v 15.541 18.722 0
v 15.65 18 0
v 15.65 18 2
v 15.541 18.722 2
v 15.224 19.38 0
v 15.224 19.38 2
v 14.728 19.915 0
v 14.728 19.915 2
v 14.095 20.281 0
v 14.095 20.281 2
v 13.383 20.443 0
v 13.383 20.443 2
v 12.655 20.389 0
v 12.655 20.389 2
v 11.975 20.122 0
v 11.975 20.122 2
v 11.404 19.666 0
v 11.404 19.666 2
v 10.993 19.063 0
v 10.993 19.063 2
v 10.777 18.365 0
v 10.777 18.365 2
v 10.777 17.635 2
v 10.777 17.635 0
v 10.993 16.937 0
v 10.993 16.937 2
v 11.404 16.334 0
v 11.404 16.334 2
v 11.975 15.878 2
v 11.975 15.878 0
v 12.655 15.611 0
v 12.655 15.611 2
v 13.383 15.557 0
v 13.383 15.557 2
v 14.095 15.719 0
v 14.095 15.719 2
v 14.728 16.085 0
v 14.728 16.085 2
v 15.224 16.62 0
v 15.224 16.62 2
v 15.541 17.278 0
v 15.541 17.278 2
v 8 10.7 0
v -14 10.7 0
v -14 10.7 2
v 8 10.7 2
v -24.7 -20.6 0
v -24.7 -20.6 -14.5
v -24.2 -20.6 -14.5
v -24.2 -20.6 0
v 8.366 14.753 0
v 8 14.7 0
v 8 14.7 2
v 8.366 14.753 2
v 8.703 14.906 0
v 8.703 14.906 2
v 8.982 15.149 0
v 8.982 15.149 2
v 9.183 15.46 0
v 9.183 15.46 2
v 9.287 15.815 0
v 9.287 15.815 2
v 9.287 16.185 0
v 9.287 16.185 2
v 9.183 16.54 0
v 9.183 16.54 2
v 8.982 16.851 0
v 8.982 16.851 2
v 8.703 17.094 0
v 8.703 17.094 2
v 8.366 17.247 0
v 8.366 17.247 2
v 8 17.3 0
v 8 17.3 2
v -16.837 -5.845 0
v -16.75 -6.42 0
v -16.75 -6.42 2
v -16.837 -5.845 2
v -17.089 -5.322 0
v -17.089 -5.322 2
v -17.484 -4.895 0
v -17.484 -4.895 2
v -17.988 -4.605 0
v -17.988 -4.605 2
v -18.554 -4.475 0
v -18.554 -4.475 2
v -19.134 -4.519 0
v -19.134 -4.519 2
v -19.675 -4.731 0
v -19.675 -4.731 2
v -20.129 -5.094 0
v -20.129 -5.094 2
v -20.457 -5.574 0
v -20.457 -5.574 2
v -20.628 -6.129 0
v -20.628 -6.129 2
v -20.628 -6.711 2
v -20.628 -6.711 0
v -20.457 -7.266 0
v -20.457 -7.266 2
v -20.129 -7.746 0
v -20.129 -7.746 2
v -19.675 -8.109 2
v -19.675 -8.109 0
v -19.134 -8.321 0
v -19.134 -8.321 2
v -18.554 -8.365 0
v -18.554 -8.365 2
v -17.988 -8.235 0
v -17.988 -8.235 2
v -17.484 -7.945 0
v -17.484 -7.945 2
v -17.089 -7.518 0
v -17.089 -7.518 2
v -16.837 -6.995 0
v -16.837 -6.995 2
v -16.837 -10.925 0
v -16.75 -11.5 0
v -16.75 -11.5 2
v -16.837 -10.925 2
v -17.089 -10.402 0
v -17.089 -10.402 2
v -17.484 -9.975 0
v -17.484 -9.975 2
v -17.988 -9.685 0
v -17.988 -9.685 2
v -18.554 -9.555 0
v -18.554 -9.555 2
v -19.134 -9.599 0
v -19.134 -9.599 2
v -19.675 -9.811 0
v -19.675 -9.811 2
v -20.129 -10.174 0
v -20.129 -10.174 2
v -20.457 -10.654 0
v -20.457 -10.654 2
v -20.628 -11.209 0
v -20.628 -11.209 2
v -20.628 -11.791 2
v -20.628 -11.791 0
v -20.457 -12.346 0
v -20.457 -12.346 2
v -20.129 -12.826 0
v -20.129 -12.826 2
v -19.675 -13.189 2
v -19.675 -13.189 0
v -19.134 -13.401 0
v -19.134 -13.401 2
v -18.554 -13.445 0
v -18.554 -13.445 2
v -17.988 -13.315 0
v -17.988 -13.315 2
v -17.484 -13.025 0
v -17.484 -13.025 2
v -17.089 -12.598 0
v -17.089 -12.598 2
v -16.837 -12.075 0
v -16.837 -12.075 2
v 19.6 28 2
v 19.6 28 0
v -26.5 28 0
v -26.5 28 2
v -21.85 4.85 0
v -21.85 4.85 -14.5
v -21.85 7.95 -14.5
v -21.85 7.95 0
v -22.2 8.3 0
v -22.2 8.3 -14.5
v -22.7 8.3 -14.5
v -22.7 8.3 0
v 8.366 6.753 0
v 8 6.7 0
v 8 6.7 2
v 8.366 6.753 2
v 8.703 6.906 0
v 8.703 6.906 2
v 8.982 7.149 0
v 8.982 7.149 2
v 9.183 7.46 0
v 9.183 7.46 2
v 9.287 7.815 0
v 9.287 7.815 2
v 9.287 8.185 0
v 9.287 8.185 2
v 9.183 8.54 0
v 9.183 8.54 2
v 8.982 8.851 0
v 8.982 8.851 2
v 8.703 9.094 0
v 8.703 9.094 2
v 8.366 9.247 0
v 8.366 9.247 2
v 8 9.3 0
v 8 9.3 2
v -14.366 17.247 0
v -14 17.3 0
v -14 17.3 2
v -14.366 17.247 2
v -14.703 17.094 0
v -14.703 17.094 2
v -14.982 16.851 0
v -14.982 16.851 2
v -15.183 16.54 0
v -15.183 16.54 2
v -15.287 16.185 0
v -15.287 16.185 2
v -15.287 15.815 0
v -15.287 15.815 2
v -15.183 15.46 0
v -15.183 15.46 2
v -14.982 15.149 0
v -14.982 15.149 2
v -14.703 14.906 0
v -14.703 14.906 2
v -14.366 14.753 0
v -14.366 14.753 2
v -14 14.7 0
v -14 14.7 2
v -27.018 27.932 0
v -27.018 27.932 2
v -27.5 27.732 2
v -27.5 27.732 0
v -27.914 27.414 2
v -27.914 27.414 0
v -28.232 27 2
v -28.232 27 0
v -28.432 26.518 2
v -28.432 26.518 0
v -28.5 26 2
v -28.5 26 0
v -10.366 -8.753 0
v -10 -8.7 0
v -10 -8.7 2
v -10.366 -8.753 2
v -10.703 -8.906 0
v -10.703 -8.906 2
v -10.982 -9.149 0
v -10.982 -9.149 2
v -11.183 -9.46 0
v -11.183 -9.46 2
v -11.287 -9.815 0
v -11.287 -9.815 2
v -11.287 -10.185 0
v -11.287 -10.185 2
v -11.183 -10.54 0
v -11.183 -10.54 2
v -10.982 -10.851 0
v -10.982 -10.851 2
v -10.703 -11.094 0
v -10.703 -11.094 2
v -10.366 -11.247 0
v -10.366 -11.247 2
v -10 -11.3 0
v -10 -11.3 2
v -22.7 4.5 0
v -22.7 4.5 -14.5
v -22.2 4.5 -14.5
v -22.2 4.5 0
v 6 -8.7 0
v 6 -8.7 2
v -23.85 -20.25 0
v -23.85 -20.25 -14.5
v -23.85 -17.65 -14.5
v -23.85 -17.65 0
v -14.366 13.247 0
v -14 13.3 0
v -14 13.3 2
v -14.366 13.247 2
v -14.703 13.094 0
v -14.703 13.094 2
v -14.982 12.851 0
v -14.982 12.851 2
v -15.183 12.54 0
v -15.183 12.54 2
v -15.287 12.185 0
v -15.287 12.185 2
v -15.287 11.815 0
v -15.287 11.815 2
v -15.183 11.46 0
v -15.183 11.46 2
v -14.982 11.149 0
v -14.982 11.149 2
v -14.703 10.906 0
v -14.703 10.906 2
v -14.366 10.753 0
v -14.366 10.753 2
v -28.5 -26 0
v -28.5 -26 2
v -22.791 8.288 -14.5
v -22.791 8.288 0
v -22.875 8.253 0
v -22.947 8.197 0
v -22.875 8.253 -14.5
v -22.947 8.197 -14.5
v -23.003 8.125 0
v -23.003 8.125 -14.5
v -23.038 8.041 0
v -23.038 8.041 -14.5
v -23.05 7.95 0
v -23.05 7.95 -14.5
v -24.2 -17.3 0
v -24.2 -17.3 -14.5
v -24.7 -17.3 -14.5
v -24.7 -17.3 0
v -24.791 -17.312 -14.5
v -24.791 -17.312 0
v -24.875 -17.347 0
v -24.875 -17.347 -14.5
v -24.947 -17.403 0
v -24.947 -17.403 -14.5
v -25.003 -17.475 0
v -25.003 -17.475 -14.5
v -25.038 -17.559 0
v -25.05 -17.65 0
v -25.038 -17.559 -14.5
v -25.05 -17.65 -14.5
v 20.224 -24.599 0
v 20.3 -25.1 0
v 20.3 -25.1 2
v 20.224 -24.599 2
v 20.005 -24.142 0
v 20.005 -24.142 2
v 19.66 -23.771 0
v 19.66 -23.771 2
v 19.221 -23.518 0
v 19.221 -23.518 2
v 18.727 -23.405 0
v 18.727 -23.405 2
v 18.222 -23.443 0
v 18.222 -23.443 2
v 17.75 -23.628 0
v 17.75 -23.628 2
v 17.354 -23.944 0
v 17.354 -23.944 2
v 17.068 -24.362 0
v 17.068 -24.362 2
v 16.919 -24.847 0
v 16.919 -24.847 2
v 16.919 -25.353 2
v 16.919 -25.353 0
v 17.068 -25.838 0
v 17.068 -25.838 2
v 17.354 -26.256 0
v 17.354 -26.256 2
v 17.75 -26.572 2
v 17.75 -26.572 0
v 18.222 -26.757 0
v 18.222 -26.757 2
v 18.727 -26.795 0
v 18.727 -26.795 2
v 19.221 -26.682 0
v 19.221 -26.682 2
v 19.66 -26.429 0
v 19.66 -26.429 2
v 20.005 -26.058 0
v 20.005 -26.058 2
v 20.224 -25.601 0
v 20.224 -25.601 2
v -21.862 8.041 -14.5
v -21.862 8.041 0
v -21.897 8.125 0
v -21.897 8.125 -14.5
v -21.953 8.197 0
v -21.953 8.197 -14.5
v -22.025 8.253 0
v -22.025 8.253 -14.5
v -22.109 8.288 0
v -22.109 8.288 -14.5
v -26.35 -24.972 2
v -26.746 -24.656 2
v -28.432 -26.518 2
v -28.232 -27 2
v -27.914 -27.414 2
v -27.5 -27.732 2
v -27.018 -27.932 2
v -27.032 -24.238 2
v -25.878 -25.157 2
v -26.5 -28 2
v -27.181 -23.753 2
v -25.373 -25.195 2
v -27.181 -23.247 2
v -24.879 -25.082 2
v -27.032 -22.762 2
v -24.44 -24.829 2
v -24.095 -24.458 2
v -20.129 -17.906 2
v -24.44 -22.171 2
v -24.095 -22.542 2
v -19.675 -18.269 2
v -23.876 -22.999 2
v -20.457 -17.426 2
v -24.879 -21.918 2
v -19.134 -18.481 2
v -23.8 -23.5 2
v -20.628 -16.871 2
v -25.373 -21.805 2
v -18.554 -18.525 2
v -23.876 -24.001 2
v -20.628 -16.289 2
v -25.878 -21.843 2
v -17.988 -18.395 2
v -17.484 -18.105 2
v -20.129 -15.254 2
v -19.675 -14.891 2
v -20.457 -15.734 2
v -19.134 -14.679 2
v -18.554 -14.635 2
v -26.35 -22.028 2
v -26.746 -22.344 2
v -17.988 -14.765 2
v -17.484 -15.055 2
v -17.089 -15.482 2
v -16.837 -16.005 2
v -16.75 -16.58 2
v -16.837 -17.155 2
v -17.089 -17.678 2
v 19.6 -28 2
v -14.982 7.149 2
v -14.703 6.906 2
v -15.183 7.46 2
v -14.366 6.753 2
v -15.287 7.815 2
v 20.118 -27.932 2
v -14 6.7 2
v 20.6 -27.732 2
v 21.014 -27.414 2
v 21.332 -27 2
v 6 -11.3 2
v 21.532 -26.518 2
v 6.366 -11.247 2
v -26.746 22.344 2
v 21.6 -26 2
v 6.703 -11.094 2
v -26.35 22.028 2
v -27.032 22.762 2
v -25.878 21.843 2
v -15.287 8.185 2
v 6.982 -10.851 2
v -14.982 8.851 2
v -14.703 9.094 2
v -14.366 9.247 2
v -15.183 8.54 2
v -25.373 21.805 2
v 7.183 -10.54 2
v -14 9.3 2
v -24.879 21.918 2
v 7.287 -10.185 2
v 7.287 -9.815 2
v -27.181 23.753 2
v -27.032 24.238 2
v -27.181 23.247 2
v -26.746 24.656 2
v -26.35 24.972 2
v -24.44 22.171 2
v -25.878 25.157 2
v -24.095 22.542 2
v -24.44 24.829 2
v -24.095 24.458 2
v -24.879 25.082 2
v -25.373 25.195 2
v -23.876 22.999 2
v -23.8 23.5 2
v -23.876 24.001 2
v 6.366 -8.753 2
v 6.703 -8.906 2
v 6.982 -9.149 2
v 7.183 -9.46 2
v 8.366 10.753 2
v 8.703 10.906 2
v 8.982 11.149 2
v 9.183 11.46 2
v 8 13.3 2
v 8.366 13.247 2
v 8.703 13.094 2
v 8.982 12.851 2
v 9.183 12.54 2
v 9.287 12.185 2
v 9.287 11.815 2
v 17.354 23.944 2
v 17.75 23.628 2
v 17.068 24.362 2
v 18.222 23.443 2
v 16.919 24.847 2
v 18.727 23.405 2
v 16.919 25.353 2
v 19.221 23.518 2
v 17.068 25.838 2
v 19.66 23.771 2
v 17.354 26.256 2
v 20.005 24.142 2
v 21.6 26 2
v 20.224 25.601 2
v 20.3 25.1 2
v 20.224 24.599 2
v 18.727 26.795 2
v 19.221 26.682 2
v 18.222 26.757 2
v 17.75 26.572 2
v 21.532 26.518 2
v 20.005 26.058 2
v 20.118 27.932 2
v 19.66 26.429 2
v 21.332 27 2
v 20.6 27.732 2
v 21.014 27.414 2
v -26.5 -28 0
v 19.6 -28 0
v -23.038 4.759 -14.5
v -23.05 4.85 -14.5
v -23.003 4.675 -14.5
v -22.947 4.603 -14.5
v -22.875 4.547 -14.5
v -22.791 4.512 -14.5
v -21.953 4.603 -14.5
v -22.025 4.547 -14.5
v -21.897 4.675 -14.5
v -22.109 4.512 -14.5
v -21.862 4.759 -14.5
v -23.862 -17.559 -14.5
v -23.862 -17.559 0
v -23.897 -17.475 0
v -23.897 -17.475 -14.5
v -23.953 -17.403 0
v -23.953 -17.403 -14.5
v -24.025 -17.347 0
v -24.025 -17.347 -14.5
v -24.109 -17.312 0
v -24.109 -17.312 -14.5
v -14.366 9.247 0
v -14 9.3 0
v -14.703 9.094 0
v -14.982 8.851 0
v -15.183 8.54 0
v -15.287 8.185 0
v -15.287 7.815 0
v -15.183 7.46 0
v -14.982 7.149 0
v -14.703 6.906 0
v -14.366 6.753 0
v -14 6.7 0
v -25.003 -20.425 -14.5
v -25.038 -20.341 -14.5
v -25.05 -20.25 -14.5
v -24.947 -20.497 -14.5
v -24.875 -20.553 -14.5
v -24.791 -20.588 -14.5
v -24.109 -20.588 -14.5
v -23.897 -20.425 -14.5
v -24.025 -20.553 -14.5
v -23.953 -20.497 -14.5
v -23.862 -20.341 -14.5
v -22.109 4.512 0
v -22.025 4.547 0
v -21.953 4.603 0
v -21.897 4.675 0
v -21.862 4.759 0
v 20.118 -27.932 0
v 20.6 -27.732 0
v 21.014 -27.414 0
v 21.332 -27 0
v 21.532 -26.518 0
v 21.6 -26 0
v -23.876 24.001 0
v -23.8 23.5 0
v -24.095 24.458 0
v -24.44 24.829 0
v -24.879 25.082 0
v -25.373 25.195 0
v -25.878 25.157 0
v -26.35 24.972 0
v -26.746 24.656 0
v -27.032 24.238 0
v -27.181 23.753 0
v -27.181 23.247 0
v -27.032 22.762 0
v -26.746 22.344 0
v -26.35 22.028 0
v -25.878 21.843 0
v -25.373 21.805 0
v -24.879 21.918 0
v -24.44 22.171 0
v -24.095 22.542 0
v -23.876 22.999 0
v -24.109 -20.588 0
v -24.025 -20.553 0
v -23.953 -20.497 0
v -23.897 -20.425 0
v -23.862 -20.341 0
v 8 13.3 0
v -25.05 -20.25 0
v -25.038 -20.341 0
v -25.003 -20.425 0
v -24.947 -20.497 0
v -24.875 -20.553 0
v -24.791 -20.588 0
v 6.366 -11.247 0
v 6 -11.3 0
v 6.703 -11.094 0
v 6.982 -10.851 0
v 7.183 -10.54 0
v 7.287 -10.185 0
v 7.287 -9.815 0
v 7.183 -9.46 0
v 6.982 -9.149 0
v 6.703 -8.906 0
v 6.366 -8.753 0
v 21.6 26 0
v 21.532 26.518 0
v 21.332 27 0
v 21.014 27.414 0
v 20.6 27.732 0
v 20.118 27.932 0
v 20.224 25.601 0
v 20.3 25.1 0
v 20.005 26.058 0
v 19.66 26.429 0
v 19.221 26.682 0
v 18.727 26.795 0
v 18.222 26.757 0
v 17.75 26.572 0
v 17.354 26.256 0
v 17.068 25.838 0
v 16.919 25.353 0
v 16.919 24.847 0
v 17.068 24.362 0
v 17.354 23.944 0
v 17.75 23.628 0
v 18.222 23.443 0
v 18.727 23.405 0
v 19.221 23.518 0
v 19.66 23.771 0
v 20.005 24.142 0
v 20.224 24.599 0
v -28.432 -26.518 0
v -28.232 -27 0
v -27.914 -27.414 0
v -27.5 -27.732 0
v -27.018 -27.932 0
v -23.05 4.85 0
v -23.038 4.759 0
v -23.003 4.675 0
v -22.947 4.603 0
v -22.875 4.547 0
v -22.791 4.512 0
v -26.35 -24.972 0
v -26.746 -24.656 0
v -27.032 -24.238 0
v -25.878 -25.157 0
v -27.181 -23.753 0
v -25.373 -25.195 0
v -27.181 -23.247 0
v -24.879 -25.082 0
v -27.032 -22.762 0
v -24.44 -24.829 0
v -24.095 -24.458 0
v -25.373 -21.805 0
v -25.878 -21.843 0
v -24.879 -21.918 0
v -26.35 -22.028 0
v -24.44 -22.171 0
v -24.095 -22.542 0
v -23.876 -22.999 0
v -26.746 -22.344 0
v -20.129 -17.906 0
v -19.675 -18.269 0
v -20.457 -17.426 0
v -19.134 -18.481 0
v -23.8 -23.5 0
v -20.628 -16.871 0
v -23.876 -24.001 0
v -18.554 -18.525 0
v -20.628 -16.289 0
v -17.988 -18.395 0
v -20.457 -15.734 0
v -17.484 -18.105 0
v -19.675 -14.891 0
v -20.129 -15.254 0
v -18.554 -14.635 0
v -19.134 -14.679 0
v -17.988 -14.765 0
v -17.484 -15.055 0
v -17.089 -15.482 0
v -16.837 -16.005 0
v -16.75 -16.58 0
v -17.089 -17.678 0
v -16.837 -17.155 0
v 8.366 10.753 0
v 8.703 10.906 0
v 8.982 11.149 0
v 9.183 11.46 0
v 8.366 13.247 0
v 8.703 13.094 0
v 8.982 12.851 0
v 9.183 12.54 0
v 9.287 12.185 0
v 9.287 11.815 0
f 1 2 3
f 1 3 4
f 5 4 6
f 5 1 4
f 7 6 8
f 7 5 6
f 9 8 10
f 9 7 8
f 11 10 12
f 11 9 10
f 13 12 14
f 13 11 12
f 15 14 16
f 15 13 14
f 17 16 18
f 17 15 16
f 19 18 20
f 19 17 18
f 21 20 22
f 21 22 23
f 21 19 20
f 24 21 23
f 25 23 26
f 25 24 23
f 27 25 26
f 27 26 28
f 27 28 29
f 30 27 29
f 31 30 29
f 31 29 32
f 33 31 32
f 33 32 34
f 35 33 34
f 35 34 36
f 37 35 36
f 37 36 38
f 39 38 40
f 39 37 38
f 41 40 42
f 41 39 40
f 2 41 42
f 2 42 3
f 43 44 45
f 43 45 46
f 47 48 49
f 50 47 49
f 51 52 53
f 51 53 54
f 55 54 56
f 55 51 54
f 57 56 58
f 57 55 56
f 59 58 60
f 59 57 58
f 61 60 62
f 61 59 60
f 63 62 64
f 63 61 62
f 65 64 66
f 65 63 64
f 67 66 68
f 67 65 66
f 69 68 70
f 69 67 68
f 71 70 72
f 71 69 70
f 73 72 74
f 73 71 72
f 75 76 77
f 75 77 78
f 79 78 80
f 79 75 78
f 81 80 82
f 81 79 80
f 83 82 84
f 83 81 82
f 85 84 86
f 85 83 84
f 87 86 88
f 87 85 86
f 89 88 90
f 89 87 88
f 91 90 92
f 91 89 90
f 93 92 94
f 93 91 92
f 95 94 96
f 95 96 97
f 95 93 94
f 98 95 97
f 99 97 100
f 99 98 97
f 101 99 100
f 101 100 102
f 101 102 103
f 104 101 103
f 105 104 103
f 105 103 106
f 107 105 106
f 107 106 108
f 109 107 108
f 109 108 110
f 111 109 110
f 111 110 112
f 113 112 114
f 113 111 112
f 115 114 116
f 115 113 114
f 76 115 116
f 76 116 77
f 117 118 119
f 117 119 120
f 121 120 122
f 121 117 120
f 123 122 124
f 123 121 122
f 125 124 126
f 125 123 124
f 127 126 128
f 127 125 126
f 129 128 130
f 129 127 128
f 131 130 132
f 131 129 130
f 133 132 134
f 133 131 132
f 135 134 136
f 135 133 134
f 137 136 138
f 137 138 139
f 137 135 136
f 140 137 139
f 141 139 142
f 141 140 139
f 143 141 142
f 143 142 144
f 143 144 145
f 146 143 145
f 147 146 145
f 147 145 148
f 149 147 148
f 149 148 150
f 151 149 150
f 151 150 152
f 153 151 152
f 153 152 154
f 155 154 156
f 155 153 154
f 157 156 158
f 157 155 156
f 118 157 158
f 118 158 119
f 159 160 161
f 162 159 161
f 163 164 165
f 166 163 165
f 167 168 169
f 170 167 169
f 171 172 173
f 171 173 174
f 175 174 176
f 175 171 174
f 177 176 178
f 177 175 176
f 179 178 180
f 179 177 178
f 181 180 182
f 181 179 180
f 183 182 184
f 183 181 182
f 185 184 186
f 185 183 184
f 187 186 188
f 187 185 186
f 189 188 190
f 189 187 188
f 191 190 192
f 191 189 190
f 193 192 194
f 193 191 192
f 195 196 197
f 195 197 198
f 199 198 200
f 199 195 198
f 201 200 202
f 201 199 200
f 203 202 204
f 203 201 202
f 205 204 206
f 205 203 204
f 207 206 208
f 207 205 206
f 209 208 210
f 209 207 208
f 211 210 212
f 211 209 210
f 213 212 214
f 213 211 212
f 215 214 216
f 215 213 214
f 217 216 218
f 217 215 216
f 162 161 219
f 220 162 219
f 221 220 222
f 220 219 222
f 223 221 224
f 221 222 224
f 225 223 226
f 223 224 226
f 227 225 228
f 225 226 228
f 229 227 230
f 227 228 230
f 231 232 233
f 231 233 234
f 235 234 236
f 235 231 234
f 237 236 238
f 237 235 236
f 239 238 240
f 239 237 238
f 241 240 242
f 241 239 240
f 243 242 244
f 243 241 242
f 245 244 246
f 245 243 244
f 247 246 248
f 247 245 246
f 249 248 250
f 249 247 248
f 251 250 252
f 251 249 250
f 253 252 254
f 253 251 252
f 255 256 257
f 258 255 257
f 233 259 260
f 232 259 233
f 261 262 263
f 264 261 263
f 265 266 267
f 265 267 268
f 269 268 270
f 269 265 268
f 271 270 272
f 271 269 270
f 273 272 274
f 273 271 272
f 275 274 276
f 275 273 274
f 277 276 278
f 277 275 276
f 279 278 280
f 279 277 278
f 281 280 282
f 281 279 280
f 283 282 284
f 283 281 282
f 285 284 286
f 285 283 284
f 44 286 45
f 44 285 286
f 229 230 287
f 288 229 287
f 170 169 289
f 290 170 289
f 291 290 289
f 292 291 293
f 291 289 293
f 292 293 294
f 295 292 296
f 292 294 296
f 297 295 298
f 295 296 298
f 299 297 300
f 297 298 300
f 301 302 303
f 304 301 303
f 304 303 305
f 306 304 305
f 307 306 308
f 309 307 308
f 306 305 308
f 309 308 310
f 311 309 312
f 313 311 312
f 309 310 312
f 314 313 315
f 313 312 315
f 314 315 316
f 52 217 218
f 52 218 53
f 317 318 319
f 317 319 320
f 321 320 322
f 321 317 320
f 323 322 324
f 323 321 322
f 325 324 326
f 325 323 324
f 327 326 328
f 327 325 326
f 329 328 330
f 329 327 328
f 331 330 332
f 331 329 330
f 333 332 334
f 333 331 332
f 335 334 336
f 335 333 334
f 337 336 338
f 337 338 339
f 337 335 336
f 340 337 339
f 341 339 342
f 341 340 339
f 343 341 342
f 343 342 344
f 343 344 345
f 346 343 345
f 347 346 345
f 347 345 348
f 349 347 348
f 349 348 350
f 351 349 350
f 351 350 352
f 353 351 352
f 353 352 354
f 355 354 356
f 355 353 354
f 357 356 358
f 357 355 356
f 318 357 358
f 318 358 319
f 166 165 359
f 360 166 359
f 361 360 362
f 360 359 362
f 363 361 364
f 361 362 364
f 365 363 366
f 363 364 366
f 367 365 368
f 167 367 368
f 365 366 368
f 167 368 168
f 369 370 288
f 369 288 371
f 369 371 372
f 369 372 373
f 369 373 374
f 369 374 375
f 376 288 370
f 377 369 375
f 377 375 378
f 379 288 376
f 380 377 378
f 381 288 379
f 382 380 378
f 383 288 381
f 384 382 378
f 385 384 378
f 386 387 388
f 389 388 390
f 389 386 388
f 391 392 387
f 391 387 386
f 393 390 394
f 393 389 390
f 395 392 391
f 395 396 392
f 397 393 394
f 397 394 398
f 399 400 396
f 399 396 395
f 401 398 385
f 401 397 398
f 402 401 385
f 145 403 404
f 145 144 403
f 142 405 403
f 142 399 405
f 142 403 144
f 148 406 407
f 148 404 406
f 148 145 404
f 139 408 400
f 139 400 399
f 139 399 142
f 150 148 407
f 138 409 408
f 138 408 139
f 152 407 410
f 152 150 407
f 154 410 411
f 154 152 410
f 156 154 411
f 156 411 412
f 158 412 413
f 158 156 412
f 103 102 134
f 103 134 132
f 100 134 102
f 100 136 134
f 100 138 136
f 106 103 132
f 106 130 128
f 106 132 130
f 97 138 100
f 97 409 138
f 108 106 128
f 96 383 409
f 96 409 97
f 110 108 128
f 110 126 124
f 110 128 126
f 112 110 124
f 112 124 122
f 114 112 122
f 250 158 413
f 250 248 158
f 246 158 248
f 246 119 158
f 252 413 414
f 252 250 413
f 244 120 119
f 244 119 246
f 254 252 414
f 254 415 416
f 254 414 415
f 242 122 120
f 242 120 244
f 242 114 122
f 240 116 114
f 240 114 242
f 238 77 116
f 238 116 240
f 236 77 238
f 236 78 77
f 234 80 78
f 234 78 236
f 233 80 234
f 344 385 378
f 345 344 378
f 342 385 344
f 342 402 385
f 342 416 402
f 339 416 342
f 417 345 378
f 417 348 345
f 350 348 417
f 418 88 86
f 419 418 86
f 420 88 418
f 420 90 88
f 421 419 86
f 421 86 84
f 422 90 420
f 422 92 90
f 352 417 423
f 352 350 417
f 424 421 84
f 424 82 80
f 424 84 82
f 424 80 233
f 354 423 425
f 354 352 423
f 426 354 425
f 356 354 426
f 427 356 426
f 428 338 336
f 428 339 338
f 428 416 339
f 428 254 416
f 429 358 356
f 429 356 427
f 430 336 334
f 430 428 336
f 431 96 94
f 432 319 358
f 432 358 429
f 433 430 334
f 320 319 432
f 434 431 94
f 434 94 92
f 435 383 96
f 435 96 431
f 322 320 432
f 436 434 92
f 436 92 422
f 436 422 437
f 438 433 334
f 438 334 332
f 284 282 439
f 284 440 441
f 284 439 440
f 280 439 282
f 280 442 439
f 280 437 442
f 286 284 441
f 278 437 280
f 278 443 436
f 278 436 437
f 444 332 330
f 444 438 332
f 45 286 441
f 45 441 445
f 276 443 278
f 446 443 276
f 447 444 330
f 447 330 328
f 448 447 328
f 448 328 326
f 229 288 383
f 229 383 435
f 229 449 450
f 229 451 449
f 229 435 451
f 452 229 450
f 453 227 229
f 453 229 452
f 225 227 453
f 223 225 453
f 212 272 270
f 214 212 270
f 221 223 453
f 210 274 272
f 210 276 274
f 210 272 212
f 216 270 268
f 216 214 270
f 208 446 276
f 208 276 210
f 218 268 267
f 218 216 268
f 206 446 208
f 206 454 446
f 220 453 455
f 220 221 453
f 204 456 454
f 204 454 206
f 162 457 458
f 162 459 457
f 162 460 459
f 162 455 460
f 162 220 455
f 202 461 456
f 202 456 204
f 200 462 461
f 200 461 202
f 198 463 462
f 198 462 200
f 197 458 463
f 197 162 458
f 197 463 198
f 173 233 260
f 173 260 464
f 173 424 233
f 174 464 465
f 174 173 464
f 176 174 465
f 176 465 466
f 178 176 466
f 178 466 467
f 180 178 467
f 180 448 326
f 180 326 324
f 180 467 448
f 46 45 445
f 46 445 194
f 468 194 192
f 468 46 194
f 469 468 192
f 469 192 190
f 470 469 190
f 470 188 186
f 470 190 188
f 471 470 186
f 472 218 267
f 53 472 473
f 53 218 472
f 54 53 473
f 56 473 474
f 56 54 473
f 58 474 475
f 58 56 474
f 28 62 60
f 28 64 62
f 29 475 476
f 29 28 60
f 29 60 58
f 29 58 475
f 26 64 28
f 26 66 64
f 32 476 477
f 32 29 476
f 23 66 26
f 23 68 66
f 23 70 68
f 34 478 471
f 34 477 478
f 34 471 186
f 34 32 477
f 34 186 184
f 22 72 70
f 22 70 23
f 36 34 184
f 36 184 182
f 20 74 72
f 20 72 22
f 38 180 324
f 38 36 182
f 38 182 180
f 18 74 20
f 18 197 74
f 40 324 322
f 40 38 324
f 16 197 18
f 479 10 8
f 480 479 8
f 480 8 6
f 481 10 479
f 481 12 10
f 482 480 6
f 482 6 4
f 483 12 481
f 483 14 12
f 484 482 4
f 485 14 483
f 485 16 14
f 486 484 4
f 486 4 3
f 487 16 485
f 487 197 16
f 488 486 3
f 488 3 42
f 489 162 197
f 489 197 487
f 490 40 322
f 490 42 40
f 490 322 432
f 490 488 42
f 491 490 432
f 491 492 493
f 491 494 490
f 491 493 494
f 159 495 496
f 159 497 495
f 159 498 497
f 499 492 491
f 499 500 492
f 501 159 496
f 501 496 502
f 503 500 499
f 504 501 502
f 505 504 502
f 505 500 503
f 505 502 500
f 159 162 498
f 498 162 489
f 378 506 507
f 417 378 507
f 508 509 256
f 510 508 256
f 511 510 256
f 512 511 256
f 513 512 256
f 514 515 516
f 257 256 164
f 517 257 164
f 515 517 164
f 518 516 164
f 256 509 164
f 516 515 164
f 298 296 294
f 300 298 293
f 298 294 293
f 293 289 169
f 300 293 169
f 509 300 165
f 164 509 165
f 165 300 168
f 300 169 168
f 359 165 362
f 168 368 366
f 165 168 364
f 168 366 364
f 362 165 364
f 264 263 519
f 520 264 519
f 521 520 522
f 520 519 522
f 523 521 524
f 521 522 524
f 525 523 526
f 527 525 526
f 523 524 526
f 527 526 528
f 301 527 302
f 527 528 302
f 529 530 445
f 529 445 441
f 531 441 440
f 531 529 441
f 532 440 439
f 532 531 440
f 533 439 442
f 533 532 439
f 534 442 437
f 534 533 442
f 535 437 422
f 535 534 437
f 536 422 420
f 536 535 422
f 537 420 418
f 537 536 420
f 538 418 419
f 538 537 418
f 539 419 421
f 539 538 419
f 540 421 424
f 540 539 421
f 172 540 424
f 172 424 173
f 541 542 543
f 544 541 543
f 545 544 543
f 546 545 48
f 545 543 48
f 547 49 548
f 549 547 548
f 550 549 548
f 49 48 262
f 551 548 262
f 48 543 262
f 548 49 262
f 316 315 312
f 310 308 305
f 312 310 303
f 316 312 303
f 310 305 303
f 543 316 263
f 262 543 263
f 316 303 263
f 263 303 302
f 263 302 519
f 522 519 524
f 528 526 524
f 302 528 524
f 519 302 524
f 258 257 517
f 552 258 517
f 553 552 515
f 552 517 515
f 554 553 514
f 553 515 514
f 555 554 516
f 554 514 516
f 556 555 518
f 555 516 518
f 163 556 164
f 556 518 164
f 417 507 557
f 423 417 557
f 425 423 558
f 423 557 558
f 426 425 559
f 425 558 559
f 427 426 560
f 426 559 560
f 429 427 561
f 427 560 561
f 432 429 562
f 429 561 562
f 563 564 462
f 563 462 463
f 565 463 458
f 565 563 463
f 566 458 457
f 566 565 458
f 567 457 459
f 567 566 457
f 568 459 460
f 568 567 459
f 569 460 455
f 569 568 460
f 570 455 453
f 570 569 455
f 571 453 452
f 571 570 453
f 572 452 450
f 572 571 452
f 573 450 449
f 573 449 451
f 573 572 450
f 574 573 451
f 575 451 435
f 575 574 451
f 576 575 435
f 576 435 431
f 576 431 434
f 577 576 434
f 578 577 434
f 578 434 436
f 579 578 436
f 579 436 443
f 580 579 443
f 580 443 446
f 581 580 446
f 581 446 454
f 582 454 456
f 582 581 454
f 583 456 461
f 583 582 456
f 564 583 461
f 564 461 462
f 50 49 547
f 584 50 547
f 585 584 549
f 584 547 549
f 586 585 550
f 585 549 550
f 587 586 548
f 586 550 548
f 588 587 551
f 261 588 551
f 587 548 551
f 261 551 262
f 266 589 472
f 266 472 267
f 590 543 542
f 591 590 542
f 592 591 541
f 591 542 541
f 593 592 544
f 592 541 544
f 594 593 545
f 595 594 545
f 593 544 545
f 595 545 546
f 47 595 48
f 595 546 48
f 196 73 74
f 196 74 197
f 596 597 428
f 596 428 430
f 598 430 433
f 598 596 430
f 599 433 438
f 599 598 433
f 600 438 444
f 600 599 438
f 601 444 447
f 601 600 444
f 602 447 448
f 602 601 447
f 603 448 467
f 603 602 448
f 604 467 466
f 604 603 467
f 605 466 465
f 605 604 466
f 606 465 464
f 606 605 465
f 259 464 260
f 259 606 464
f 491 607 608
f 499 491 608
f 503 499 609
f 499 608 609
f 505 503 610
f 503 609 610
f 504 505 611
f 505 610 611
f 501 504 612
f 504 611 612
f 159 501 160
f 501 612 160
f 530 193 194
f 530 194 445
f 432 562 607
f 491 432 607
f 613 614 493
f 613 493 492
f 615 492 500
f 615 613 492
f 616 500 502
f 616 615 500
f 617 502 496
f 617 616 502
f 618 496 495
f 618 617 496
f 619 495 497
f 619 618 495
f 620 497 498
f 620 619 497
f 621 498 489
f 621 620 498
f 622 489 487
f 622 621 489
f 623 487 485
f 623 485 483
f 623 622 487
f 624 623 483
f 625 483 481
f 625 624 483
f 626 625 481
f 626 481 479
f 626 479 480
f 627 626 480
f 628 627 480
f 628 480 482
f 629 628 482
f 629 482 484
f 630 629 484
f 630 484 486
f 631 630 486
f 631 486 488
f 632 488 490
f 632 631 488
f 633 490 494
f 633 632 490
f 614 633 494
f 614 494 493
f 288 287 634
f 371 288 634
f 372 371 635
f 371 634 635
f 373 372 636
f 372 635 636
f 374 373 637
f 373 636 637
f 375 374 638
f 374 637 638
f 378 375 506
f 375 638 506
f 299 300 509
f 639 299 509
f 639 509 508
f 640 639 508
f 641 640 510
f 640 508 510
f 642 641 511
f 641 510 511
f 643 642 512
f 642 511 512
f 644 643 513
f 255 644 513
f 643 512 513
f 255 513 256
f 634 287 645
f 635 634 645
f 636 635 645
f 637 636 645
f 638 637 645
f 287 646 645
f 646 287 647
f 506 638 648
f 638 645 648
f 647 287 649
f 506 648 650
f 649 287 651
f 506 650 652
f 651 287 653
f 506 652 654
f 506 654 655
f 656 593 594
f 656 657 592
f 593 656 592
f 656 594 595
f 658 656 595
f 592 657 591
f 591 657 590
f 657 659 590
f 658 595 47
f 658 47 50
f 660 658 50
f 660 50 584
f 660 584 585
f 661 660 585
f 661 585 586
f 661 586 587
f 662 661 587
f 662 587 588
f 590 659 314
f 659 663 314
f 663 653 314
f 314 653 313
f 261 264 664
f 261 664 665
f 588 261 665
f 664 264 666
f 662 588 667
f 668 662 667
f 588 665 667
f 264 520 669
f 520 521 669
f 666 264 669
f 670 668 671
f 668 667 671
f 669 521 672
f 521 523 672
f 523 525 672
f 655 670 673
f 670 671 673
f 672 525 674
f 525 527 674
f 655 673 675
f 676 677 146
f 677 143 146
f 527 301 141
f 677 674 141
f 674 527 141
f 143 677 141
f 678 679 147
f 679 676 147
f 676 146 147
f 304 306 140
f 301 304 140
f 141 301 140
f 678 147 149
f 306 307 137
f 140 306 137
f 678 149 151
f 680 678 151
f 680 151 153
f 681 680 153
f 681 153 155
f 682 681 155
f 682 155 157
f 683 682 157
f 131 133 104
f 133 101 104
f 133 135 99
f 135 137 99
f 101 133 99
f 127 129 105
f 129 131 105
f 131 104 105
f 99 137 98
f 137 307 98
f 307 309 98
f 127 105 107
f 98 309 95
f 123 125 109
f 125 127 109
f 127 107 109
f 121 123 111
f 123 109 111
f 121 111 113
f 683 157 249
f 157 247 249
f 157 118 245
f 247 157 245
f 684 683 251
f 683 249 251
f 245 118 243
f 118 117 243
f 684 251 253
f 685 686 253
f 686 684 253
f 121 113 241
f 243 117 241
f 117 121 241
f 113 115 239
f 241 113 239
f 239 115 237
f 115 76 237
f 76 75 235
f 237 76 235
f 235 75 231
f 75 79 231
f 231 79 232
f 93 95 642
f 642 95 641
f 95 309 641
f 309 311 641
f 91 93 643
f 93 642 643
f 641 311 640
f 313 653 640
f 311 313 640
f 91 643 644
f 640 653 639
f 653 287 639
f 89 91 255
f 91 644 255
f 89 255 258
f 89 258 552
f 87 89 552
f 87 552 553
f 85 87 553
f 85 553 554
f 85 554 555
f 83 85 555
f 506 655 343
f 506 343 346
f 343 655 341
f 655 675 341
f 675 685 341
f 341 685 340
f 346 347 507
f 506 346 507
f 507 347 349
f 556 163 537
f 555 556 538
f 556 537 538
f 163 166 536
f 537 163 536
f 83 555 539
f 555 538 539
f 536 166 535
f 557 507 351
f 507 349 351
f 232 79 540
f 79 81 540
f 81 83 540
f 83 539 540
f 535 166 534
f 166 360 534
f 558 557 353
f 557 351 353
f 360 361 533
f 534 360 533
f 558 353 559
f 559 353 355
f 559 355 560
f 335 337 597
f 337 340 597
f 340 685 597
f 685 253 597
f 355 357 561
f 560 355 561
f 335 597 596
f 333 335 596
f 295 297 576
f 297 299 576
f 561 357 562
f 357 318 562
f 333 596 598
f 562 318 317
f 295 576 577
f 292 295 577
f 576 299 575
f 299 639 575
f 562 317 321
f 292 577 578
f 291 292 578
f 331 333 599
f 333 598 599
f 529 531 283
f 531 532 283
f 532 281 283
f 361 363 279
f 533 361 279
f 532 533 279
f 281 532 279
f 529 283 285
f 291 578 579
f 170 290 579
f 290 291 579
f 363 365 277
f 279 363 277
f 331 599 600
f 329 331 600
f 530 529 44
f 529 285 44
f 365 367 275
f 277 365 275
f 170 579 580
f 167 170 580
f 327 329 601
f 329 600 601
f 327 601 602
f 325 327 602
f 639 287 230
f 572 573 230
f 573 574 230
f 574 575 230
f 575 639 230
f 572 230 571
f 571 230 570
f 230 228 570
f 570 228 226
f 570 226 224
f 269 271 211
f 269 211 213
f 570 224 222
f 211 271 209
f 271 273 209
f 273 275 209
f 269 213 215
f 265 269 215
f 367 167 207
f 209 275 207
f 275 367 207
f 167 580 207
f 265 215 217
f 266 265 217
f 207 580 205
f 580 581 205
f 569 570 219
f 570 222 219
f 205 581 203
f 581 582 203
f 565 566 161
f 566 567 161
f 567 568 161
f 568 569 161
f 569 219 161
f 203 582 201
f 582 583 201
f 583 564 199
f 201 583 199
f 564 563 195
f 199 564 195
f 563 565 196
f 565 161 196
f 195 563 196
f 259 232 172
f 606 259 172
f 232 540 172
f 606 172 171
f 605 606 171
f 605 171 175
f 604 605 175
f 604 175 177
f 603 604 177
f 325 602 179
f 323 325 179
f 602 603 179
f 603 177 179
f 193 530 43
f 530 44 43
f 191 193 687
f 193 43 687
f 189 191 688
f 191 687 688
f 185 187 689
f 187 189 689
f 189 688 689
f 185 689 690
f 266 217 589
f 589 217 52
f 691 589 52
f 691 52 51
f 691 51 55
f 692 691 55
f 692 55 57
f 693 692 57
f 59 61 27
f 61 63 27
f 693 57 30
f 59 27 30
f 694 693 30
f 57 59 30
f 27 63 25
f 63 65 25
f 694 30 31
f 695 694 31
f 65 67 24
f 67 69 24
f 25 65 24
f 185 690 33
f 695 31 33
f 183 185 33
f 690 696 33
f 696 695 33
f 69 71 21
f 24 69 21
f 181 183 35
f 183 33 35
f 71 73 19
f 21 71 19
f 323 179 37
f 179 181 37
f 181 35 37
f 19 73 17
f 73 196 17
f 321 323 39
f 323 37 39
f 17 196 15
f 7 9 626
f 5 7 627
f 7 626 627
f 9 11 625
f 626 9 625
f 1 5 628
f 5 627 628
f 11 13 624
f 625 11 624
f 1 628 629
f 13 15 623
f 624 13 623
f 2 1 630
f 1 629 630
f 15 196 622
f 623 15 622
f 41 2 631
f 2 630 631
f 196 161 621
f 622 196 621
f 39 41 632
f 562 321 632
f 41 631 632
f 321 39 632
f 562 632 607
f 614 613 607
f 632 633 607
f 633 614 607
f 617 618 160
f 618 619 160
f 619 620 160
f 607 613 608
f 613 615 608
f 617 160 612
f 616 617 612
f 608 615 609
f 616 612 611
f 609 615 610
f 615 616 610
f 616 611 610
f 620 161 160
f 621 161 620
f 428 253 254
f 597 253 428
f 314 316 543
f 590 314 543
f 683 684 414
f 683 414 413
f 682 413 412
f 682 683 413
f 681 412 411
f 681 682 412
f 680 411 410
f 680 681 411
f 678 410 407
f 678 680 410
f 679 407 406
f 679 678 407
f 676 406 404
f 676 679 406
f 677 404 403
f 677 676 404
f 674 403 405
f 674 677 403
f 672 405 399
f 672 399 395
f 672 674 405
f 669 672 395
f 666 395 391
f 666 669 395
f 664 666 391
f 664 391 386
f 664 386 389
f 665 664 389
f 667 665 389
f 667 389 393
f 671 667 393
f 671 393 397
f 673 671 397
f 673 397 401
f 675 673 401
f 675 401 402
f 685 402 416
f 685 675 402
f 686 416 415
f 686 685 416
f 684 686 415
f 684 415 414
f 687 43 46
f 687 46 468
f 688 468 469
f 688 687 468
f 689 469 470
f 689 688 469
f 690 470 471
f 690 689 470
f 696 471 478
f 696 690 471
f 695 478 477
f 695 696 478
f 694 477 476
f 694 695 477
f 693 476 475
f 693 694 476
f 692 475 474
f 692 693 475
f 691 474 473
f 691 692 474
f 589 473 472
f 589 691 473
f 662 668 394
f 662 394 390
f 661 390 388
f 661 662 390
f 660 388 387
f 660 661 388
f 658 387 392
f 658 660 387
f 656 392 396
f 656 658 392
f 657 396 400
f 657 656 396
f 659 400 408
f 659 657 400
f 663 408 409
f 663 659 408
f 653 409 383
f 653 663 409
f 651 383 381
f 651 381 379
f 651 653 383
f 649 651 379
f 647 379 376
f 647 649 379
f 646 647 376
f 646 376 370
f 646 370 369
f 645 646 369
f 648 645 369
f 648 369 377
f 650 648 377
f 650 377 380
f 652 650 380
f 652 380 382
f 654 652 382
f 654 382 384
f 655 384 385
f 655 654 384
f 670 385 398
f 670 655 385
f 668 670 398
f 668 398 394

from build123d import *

# Parameters (mm, degrees)
CLEAR_GUARD_2MM_SKETCH_R                 = 1.7
CLEAR_GUARD_2MM_DEPTH                    = 2
OPENINGS_VENT_AND_TRIM_ACCESS_SKETCH_R   = 2.45
OPENINGS_VENT_AND_TRIM_ACCESS_SKETCH_R_2 = 1.95
OPENINGS_VENT_AND_TRIM_ACCESS_DEPTH      = 2
PCB_END_STOPS_START                      = -14.5
PCB_END_STOPS_DEPTH                      = 14.5


with BuildPart() as part:
    # Clear_guard_2mm_Sketch → Clear_guard_2mm (new body)
    with BuildSketch(Plane.XY):
        with BuildLine():
            Line((-26.5, -28), (19.6, -28))
            ThreePointArc((19.6, -28), (21.014213562, -27.414213562), (21.6, -26))
            Line((21.6, -26), (21.6, 26))
            ThreePointArc((21.6, 26), (21.014213562, 27.414213562), (19.6, 28))
            Line((19.6, 28), (-26.5, 28))
            ThreePointArc((-26.5, 28), (-27.914213562, 27.414213562), (-28.5, 26))
            Line((-28.5, 26), (-28.5, -26))
            ThreePointArc((-28.5, -26), (-27.914213562, -27.414213562), (-26.5, -28))
        make_face()
        with Locations((-25.5, -23.5)):
            Circle(CLEAR_GUARD_2MM_SKETCH_R, mode=Mode.SUBTRACT)
        with Locations((18.6, -25.1)):
            Circle(CLEAR_GUARD_2MM_SKETCH_R, mode=Mode.SUBTRACT)
        with Locations((-25.5, 23.5)):
            Circle(CLEAR_GUARD_2MM_SKETCH_R, mode=Mode.SUBTRACT)
        with Locations((18.6, 25.1)):
            Circle(CLEAR_GUARD_2MM_SKETCH_R, mode=Mode.SUBTRACT)
    extrude(amount=CLEAR_GUARD_2MM_DEPTH)

    # Openings_vent_and_trim_access_Sketch → Openings_vent_and_trim_access (cut)
    with BuildSketch(Plane.XY):
        with Locations((13.2, 18)):
            Circle(OPENINGS_VENT_AND_TRIM_ACCESS_SKETCH_R)
        with Locations((-18.7, -16.58)):
            Circle(OPENINGS_VENT_AND_TRIM_ACCESS_SKETCH_R_2)
        with Locations((-18.7, -11.5)):
            Circle(OPENINGS_VENT_AND_TRIM_ACCESS_SKETCH_R_2)
        with Locations((-18.7, -6.42)):
            Circle(OPENINGS_VENT_AND_TRIM_ACCESS_SKETCH_R_2)
        with BuildLine():
            Line((-14, 6.7), (8, 6.7))
            ThreePointArc((8, 6.7), (9.3, 8), (8, 9.3))
            Line((8, 9.3), (-14, 9.3))
            ThreePointArc((-14, 9.3), (-15.3, 8), (-14, 6.7))
        make_face()
        with BuildLine():
            Line((-14, 10.7), (8, 10.7))
            ThreePointArc((8, 10.7), (9.3, 12), (8, 13.3))
            Line((8, 13.3), (-14, 13.3))
            ThreePointArc((-14, 13.3), (-15.3, 12), (-14, 10.7))
        make_face()
        with BuildLine():
            Line((-14, 14.7), (8, 14.7))
            ThreePointArc((8, 14.7), (9.3, 16), (8, 17.3))
            Line((8, 17.3), (-14, 17.3))
            ThreePointArc((-14, 17.3), (-15.3, 16), (-14, 14.7))
        make_face()
        with BuildLine():
            Line((-10, -11.3), (6, -11.3))
            ThreePointArc((6, -11.3), (7.3, -10), (6, -8.7))
            Line((6, -8.7), (-10, -8.7))
            ThreePointArc((-10, -8.7), (-11.3, -10), (-10, -11.3))
        make_face()
    extrude(amount=OPENINGS_VENT_AND_TRIM_ACCESS_DEPTH, mode=Mode.SUBTRACT)

    # PCB_end_stops_Sketch → PCB_end_stops (add)
    with BuildSketch(Plane.XY.offset(PCB_END_STOPS_START)):
        with BuildLine():
            Line((-22.7, 4.5), (-22.2, 4.5))
            ThreePointArc((-22.2, 4.5), (-21.952512627, 4.602512627), (-21.85, 4.85))
            Line((-21.85, 4.85), (-21.85, 7.95))
            ThreePointArc((-21.85, 7.95), (-21.952512627, 8.197487373), (-22.2, 8.3))
            Line((-22.2, 8.3), (-22.7, 8.3))
            ThreePointArc((-22.7, 8.3), (-22.947487373, 8.197487373), (-23.05, 7.95))
            Line((-23.05, 7.95), (-23.05, 4.85))
            ThreePointArc((-23.05, 4.85), (-22.947487373, 4.602512627), (-22.7, 4.5))
        make_face()
        with BuildLine():
            Line((-24.7, -20.6), (-24.2, -20.6))
            ThreePointArc((-24.2, -20.6), (-23.952512627, -20.497487373), (-23.85, -20.25))
            Line((-23.85, -20.25), (-23.85, -17.65))
            ThreePointArc((-23.85, -17.65), (-23.952512627, -17.402512627), (-24.2, -17.3))
            Line((-24.2, -17.3), (-24.7, -17.3))
            ThreePointArc((-24.7, -17.3), (-24.947487373, -17.402512627), (-25.05, -17.65))
            Line((-25.05, -17.65), (-25.05, -20.25))
            ThreePointArc((-25.05, -20.25), (-24.947487373, -20.497487373), (-24.7, -20.6))
        make_face()
    extrude(amount=PCB_END_STOPS_DEPTH)


solid = part.part
